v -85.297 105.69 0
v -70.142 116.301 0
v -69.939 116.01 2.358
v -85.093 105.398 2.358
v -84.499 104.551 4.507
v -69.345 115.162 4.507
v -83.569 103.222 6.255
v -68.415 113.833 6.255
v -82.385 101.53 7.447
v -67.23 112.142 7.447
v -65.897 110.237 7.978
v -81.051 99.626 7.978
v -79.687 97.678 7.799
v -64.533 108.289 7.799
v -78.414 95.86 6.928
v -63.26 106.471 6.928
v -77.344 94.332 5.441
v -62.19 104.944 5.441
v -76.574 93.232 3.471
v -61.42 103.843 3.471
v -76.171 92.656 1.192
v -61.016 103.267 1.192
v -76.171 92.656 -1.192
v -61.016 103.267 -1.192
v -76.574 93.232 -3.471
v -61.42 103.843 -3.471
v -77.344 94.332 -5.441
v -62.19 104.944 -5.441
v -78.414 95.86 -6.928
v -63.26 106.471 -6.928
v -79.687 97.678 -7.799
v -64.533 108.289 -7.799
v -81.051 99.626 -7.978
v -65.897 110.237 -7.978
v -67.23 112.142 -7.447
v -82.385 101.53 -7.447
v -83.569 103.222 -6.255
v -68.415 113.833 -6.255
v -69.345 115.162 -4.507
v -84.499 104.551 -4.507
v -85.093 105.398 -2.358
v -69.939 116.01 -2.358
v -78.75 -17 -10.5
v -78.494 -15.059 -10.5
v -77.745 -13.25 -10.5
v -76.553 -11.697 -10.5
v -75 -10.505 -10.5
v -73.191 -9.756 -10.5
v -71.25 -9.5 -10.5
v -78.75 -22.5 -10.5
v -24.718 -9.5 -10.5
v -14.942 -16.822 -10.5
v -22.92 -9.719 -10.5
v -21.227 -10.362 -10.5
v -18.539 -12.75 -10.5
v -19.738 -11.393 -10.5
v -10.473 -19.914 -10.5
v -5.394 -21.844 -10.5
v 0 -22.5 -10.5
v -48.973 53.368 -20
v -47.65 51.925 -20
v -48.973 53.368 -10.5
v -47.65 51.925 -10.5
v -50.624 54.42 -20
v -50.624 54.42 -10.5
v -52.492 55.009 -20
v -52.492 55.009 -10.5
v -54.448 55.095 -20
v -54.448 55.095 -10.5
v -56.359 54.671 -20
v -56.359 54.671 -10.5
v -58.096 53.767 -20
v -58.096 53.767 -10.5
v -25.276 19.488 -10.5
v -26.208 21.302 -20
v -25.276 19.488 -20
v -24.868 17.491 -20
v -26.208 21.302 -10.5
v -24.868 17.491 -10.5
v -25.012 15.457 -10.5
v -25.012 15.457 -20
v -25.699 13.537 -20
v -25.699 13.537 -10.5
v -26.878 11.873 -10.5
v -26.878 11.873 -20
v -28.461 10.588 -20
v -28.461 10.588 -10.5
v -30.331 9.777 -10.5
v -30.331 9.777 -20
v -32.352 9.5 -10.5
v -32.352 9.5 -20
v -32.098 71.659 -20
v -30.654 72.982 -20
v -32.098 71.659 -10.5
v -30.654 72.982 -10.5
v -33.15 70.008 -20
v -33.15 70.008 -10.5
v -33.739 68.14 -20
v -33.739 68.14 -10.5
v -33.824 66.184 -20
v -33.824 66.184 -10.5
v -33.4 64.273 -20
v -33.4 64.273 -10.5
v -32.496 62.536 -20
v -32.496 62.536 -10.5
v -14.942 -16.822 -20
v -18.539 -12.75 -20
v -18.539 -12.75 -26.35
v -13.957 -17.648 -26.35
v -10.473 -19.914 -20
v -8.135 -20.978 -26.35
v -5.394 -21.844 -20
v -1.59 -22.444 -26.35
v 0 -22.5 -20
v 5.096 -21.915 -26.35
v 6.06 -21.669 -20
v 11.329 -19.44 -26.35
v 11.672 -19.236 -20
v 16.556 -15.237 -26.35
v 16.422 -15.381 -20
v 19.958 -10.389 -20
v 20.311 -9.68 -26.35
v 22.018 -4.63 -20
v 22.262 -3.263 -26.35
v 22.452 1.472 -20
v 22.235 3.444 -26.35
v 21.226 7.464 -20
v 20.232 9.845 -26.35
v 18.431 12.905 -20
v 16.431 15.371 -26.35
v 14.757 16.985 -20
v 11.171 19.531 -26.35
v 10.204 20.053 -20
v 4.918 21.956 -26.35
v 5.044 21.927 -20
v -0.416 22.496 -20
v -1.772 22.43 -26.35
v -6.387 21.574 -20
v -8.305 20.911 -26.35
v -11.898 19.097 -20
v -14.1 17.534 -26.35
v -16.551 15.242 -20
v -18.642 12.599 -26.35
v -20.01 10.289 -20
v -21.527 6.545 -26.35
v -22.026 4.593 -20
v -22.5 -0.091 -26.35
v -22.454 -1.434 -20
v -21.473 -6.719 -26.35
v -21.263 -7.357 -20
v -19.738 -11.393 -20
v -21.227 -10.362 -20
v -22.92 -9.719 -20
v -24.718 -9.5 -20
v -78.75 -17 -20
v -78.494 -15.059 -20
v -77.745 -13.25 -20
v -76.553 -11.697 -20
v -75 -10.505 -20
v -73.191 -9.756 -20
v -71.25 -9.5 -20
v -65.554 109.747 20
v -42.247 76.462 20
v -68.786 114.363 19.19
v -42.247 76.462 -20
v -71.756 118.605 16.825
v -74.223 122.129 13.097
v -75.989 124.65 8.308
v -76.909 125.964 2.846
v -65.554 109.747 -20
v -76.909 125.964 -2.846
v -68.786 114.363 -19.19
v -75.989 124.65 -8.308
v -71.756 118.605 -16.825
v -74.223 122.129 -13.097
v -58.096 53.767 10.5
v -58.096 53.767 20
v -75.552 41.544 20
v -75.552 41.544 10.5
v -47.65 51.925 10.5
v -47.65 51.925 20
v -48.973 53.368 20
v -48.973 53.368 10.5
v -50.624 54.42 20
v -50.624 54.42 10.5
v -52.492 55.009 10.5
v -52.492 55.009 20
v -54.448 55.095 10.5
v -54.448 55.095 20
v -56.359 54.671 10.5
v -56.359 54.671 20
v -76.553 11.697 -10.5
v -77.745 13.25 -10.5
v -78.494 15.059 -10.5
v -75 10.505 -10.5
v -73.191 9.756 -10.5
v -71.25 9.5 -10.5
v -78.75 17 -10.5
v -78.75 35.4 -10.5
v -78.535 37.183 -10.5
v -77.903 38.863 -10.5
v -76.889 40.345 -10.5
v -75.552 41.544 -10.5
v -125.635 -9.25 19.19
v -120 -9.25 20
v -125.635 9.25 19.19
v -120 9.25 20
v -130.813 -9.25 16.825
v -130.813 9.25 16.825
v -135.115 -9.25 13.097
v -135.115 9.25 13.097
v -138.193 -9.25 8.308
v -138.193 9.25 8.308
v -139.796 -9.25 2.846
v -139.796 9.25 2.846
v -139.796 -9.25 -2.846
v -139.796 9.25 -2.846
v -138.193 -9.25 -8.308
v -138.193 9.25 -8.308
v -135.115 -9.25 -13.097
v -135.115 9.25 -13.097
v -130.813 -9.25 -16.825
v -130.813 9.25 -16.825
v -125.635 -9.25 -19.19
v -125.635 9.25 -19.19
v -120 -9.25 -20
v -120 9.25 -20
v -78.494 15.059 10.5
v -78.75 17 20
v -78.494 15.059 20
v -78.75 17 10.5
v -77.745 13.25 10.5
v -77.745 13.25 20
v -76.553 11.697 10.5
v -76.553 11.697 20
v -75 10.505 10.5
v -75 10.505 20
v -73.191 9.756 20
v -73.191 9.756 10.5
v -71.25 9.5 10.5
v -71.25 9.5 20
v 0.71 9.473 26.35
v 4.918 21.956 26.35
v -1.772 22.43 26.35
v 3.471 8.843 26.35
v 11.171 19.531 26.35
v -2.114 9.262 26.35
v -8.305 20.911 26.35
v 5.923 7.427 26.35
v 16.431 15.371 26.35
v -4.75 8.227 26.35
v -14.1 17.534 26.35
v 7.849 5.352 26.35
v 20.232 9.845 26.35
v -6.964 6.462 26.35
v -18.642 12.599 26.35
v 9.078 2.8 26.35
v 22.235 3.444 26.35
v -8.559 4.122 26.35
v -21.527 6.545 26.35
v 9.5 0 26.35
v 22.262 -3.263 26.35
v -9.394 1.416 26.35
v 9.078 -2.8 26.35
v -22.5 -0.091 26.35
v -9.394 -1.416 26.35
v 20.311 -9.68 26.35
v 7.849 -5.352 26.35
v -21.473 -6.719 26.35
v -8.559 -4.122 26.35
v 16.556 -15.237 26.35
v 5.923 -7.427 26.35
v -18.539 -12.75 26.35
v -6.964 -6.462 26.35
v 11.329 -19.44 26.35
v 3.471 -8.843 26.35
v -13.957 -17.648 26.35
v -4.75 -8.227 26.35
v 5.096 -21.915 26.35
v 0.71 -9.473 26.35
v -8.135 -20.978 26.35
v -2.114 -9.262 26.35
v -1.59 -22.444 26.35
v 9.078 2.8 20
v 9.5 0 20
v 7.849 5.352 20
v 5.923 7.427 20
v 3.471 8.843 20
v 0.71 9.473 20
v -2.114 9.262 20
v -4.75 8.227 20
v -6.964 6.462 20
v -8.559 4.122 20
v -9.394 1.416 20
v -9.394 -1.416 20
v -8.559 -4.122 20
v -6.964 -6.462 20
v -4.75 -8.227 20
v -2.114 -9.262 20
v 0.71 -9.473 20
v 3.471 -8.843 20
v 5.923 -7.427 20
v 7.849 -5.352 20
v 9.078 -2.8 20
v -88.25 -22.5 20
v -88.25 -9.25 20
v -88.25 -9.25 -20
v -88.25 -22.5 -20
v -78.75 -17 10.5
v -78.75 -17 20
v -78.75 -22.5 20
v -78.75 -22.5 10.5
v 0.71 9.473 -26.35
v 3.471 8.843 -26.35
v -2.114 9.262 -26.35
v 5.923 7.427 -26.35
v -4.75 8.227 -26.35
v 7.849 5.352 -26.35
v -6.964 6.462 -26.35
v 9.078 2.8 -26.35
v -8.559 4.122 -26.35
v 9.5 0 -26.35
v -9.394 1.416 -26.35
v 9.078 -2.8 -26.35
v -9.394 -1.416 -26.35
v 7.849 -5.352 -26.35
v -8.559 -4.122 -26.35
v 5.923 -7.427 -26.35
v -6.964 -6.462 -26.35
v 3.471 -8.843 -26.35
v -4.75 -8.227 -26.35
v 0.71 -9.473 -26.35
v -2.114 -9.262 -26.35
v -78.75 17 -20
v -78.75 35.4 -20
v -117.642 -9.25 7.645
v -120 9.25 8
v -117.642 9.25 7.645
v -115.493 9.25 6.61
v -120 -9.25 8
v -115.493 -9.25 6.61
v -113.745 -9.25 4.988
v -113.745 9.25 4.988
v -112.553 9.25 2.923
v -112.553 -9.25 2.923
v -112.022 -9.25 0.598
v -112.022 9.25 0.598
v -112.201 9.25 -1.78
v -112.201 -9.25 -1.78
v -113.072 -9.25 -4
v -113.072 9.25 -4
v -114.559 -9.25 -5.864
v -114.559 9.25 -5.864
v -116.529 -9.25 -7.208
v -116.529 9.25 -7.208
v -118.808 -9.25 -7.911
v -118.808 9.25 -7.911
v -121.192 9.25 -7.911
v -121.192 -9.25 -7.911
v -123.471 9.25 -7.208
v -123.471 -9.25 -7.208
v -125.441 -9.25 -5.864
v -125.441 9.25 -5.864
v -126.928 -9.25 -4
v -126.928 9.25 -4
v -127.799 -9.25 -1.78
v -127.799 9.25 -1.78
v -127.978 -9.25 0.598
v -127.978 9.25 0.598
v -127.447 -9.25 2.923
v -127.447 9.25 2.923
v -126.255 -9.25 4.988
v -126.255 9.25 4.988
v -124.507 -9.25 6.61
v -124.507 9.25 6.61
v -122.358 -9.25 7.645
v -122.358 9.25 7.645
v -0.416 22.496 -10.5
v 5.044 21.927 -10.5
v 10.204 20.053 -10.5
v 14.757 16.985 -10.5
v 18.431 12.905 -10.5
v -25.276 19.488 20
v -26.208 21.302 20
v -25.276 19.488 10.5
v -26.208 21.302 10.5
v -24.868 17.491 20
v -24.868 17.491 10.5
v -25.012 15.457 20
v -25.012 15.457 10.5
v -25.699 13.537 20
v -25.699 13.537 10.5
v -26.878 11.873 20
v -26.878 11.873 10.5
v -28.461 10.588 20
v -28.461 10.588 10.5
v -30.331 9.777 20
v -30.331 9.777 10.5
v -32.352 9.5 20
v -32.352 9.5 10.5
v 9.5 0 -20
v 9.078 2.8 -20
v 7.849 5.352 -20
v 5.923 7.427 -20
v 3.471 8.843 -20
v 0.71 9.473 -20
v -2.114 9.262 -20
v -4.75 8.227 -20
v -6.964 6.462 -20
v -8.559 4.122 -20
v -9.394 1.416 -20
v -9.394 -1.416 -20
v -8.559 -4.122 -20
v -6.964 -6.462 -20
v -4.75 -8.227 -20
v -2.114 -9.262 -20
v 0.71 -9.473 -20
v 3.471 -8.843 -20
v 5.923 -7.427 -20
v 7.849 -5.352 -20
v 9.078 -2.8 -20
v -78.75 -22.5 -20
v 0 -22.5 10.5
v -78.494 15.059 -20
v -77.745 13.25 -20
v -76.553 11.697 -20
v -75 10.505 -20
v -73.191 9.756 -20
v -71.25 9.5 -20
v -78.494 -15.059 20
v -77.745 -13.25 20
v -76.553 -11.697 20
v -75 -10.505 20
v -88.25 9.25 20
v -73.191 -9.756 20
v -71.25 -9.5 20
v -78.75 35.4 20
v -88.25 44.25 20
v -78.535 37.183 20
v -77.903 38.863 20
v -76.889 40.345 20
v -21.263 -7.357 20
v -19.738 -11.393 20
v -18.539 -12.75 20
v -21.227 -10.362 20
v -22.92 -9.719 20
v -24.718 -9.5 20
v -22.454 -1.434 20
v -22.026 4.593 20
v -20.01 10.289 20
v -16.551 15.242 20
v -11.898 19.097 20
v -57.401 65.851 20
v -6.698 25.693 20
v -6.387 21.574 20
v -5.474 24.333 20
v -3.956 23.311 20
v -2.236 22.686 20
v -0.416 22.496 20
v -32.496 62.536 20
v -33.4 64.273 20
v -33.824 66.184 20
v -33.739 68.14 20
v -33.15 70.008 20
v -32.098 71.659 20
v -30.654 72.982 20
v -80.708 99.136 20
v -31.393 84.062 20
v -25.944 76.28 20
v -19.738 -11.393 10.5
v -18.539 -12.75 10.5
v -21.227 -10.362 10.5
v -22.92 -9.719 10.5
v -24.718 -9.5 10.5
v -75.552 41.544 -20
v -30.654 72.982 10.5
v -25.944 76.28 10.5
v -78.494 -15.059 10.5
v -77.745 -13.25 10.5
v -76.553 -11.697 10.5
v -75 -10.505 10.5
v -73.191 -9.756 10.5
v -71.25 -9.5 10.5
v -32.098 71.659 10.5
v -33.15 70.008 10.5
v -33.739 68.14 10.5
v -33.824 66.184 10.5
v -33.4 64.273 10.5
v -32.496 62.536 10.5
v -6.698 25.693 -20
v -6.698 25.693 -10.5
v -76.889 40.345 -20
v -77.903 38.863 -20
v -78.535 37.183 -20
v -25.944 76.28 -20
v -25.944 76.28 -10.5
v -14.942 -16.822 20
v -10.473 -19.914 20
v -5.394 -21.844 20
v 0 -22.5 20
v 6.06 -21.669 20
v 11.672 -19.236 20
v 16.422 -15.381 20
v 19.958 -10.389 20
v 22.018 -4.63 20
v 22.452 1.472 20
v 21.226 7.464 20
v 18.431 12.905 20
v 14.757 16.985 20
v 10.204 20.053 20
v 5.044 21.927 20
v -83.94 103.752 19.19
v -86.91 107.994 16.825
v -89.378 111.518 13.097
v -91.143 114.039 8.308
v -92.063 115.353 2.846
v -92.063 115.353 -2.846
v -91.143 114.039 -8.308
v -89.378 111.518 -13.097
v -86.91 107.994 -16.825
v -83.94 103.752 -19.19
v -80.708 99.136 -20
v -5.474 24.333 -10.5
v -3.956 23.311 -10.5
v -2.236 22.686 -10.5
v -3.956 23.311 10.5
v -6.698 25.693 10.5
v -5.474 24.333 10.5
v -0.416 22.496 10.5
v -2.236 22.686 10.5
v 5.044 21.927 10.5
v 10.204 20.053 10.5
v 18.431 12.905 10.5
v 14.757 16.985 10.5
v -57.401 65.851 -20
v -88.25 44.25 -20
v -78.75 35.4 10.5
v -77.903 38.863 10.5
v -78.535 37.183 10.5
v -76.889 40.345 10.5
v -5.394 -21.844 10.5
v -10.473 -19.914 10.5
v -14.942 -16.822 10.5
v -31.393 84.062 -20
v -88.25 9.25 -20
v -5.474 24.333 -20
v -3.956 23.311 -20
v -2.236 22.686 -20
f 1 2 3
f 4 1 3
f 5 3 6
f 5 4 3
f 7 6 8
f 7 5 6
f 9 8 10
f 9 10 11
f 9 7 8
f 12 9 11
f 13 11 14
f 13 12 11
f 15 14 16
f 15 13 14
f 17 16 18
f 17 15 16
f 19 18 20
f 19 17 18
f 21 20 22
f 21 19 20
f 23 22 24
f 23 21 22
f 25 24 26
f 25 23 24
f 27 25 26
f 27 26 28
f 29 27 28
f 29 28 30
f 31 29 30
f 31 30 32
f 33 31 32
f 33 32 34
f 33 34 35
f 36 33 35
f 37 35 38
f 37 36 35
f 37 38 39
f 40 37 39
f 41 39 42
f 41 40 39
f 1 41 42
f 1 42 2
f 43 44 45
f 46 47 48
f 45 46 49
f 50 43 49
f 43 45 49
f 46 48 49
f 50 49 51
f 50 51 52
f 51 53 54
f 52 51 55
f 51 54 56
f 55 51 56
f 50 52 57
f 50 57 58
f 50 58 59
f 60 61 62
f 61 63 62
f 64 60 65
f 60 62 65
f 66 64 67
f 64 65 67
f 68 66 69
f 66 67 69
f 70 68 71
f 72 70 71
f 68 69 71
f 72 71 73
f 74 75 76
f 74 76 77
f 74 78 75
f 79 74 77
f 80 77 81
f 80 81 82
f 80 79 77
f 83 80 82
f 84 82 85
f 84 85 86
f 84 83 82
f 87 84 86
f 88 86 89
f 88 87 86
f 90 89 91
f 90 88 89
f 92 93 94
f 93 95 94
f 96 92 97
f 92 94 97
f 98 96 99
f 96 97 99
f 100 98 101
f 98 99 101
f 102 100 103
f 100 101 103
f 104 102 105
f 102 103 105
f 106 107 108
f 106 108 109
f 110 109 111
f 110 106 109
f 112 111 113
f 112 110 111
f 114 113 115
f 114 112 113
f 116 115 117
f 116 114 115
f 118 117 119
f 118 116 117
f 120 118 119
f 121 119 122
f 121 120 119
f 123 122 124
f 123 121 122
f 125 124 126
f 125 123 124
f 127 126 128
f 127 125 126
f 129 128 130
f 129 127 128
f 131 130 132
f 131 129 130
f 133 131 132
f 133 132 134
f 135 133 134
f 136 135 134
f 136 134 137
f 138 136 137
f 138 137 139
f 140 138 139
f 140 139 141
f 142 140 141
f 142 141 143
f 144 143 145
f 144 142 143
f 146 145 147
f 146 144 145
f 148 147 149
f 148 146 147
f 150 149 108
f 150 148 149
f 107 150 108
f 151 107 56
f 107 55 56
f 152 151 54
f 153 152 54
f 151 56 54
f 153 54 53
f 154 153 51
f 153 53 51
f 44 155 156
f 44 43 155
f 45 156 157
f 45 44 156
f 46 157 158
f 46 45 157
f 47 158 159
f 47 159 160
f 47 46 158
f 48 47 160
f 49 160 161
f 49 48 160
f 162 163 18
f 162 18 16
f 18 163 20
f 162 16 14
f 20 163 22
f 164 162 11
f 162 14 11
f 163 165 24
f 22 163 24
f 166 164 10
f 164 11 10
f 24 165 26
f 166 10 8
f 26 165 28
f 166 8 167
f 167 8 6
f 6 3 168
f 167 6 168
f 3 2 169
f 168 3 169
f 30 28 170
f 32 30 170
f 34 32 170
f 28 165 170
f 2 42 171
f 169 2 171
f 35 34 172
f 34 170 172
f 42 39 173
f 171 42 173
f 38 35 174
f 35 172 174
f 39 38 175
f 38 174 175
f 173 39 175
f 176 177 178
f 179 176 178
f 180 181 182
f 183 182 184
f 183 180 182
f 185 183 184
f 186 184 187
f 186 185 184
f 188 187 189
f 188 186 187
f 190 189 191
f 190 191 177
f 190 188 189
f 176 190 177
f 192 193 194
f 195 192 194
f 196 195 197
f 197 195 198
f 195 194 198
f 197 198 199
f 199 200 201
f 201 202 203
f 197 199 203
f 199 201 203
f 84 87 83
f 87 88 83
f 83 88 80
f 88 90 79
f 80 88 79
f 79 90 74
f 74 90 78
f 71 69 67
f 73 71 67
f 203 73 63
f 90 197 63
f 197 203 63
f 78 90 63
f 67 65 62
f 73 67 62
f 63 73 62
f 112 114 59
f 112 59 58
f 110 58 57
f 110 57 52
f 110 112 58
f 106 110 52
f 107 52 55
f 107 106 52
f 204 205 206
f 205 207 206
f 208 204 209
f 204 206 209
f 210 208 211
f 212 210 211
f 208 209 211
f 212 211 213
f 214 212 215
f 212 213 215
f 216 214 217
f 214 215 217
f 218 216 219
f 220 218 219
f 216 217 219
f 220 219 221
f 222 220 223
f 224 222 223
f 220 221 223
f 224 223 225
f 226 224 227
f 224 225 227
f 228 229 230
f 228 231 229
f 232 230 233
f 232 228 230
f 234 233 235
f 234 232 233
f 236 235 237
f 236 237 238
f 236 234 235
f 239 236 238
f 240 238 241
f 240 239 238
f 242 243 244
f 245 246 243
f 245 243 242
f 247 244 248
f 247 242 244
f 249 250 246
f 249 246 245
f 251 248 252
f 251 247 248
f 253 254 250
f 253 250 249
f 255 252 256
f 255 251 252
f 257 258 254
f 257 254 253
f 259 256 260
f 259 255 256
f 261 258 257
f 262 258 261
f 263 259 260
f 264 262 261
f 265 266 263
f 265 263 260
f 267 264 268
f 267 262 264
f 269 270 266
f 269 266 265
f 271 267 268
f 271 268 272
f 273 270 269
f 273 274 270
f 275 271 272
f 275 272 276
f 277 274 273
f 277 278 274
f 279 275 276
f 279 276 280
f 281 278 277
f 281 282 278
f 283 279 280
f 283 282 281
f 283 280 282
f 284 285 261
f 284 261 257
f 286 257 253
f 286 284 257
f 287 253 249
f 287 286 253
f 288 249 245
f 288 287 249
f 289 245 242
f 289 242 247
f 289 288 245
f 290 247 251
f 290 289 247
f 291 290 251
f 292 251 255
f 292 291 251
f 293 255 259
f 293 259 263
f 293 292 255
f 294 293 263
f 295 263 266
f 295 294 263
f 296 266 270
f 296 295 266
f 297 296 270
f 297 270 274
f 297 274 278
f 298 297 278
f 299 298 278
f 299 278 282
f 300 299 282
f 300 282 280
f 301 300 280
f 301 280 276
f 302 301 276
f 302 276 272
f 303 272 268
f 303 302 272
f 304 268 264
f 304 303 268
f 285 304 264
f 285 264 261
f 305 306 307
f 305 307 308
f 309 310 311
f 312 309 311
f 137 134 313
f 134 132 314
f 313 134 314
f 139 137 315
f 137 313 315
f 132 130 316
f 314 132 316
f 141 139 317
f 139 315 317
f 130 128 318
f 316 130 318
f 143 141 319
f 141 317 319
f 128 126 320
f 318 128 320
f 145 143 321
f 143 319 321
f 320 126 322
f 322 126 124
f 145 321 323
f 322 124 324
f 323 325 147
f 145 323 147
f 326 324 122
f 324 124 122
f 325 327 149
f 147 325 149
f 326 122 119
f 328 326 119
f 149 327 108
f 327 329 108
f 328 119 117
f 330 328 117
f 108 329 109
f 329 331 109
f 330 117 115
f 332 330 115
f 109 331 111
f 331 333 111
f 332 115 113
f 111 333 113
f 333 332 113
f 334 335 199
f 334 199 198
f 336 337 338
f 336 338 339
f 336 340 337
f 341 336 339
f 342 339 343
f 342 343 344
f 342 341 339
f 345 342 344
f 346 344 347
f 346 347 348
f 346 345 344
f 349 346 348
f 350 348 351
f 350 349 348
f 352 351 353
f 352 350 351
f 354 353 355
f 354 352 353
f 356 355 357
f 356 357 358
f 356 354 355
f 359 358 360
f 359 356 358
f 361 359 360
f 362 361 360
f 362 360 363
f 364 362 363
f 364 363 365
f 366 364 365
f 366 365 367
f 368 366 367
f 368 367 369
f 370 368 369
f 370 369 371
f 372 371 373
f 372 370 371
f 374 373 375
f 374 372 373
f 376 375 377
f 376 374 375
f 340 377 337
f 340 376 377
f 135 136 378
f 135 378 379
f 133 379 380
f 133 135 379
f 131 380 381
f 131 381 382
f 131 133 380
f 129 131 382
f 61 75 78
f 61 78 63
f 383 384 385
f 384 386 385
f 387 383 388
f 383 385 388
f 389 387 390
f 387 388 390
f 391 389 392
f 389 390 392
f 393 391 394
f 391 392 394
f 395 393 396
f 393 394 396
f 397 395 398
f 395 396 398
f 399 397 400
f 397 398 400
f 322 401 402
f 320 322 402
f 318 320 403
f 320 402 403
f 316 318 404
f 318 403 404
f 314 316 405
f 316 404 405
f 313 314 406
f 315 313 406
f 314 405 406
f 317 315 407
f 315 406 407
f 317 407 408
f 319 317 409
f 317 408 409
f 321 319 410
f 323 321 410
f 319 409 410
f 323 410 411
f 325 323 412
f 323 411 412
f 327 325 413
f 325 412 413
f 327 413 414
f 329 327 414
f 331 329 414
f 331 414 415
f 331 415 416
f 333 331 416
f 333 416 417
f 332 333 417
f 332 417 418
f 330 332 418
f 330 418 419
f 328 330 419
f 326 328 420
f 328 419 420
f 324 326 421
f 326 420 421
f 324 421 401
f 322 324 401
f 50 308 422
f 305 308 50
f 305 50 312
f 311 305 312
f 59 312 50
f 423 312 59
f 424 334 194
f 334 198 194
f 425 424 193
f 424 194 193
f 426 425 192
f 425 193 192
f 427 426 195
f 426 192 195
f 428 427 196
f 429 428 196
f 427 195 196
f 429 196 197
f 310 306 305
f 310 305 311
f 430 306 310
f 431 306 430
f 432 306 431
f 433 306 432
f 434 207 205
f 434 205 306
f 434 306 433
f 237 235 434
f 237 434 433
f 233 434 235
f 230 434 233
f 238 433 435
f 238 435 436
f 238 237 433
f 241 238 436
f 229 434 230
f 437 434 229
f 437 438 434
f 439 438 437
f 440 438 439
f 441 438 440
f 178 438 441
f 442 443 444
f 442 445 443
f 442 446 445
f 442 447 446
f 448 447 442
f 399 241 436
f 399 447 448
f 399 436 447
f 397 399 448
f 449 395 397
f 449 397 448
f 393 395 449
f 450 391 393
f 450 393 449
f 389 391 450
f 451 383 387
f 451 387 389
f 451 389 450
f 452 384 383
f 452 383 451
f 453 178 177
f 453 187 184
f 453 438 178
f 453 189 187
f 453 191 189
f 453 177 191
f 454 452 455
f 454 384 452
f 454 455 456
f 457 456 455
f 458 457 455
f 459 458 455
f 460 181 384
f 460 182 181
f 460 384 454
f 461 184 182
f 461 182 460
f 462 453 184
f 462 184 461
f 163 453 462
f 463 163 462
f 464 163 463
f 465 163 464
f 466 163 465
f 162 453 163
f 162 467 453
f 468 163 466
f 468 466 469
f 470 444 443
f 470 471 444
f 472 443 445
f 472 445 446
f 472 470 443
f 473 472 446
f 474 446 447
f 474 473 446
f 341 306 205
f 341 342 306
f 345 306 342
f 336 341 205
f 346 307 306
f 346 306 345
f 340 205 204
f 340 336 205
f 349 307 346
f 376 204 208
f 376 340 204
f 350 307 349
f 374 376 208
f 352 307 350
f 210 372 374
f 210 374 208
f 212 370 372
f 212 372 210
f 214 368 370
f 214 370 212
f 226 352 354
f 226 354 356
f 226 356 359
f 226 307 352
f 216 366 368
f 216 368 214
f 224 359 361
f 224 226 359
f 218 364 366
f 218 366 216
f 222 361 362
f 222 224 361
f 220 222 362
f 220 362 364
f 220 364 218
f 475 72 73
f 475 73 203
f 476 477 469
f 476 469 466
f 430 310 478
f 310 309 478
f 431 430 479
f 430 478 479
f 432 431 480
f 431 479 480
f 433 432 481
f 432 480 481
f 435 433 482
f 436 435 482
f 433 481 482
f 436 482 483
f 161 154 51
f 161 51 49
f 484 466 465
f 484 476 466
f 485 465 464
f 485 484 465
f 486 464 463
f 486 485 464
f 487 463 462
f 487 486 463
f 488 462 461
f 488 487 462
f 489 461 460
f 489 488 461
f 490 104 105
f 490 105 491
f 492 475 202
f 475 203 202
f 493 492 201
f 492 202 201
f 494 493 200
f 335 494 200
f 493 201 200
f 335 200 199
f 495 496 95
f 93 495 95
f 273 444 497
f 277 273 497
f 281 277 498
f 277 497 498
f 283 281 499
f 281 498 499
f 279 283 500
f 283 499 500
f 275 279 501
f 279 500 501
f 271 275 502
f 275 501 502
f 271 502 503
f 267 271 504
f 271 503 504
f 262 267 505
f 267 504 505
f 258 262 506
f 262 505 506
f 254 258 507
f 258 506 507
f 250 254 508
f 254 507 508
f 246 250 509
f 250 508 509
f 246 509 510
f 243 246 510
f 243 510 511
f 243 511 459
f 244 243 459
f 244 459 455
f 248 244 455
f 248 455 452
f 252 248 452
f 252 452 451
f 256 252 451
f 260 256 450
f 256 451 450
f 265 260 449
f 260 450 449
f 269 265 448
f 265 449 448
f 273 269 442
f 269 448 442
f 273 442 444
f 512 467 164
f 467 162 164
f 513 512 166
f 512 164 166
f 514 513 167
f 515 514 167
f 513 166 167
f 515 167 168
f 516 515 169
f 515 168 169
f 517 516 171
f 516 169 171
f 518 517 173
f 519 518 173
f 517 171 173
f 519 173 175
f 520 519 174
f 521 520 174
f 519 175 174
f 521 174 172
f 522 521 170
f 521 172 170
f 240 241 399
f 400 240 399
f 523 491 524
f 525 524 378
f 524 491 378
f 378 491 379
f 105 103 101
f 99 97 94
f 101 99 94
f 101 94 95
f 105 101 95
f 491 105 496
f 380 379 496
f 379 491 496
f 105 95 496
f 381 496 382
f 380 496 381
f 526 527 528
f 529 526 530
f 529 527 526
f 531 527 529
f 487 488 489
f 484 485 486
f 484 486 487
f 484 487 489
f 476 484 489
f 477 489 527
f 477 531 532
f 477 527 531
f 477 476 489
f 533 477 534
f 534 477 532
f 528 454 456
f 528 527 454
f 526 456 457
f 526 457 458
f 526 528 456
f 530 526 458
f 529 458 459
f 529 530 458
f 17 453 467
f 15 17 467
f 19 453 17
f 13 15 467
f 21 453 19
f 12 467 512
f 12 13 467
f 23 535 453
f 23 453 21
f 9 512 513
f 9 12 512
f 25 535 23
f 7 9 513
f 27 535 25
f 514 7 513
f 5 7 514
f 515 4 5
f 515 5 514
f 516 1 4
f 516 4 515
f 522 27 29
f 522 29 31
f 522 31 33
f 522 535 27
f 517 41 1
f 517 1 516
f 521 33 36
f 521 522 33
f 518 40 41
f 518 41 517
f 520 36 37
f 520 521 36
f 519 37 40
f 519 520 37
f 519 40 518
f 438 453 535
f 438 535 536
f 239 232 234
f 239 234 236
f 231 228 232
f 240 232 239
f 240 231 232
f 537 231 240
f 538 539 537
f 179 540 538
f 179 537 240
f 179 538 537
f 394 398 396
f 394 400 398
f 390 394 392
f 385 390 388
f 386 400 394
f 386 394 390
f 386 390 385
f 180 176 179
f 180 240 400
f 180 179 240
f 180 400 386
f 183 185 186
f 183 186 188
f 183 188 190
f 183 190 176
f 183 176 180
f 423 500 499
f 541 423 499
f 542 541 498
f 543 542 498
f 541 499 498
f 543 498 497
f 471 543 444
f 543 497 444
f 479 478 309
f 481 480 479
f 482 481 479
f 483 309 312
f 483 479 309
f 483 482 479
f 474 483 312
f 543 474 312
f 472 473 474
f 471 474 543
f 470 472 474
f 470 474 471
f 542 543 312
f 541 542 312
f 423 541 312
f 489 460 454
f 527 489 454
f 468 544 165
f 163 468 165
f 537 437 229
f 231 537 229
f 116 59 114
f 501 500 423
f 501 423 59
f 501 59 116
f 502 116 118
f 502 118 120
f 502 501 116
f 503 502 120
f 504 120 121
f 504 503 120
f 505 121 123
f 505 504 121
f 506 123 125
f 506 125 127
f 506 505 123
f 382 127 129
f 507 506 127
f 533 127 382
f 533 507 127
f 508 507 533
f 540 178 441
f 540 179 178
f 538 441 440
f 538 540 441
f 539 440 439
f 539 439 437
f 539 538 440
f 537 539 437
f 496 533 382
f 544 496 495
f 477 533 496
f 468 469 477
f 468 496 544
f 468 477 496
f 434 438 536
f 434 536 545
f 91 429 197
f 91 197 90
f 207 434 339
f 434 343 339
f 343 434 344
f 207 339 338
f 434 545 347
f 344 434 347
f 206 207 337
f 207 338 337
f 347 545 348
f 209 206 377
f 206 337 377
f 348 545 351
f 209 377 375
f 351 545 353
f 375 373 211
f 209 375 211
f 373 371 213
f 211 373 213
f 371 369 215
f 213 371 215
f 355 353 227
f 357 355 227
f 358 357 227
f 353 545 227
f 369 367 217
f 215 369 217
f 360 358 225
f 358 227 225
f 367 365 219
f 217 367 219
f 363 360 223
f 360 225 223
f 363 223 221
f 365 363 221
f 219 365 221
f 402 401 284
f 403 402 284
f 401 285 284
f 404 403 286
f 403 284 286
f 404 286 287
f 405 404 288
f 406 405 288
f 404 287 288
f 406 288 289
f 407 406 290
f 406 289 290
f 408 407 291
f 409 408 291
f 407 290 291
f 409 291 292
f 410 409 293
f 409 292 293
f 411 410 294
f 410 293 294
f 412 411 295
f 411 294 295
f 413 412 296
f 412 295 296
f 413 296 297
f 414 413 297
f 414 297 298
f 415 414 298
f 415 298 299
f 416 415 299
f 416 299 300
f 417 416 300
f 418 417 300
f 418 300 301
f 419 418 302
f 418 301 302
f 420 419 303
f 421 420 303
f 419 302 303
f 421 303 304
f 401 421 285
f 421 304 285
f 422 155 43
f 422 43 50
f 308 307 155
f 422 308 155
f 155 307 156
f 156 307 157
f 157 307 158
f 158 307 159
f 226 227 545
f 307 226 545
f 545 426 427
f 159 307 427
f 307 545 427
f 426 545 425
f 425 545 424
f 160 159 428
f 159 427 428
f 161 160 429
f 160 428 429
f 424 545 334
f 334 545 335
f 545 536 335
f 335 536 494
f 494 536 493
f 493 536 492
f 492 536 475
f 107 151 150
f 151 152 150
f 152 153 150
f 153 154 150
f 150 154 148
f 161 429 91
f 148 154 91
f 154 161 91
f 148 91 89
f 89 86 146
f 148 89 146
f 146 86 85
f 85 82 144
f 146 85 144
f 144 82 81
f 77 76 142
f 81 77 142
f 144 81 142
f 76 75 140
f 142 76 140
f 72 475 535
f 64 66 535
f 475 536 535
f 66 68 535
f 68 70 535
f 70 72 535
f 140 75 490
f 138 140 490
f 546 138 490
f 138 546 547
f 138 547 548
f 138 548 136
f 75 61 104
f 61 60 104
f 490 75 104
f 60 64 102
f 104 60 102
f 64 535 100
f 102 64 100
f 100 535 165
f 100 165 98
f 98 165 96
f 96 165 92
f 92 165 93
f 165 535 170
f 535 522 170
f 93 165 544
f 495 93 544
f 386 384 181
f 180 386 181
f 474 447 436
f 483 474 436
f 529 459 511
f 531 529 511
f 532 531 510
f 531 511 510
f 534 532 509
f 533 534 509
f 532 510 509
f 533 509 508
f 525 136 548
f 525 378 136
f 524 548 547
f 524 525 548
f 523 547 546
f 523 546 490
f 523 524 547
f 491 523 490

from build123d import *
from build123d.topology import SkipClean

# Parameters (mm, degrees)
SKETCH2_R            = 8
BOSS_EXTRUDE1_DEPTH  = 9.25
SKETCH3_R            = 8
BOSS_EXTRUDE2_DEPTH  = 9.25
SKETCH5_R            = 22.5
BOSS_EXTRUDE3_DEPTH  = 20
SKETCH6_R            = 9.5
CUT_EXTRUDE1_DEPTH   = 20
CUT_EXTRUDE3_DEPTH   = 9.5
FILLET1_R            = 7.5
FILLET1_OF_MIRROR1_R = 7.5
SKETCH9_R            = 22.5
SKETCH9_R_2          = 9.5
BOSS_EXTRUDE5_DEPTH  = 6.35


with BuildPart() as part:
    # Sketch2 → Boss-Extrude1 (new, symmetric)
    with BuildSketch(Plane(origin=(0, 0, 0), x_dir=(1, 0, 0), z_dir=(0, 1, 0))):
        with BuildLine():
            Line((0, -20), (-120, -20))
            ThreePointArc((-120, -20), (-140, 0), (-120, 20))
            Line((-120, 20), (0, 20))
            Line((0, 20), (0, -20))
        make_face()
        with Locations(Location((-120, 0, 0), (0, 0, 270))):
            Circle(SKETCH2_R, mode=Mode.SUBTRACT)
    extrude(amount=BOSS_EXTRUDE1_DEPTH, both=True)

    # Sketch3 → Boss-Extrude2 (add, symmetric)
    with BuildSketch(Plane(origin=(0, 0, 0), x_dir=(0.5735764363510444, -0.819152044288993, 0), z_dir=(0.819152044288993, 0.5735764363510444, 0))):
        with BuildLine():
            Line((0, -20), (-127.5, -20))
            ThreePointArc((-127.5, -20), (-147.5, 0), (-127.5, 20))
            Line((-127.5, 20), (0, 20))
            Line((0, 20), (0, -20))
        make_face()
        with Locations(Location((-127.5, 0, 0), (0, 0, 180))):
            Circle(SKETCH3_R, mode=Mode.SUBTRACT)
    extrude(amount=BOSS_EXTRUDE2_DEPTH, both=True)

    # Sketch5 → Boss-Extrude3 (add, symmetric)
    with BuildSketch(Plane.XY):
        with BuildLine():
            Line((-88.25, -22.5), (0, -22.5))
            ThreePointArc((0, -22.5), (-19.957743747, 10.389343798), (18.430920997, 12.905469818))
            Line((18.430920997, 12.905469818), (-31.393139414, 84.061602381))
            Line((-31.393139414, 84.061602381), (-88.25, 44.25))
            Line((-88.25, 44.25), (-88.25, -22.5))
        make_face()
        Circle(SKETCH5_R)
    extrude(amount=BOSS_EXTRUDE3_DEPTH, both=True)

    # Sketch6 → Cut-Extrude1 (cut, symmetric)
    with BuildSketch(Plane.XY):
        Circle(SKETCH6_R)
    extrude(amount=CUT_EXTRUDE1_DEPTH, both=True, mode=Mode.SUBTRACT)

    # Sketch7 → Cut-Extrude3 (cut)
    with BuildSketch(Plane.XY.offset(20)):
        with BuildLine():
            Line((-78.75, -22.5), (0, -22.5))
            ThreePointArc((0, -22.5), (-12.093386622, -18.973665961), (-20.396078054, -9.5))
            Line((-20.396078054, -9.5), (-78.75, -9.5))
            Line((-78.75, -9.5), (-78.75, -22.5))
        make_face()
        with BuildLine():
            Line((-25.944163269, 76.27965796), (-36.797927856, 68.679770179))
            Line((-36.797927856, 68.679770179), (-4.187279424, 22.106937622))
            ThreePointArc((-4.187279424, 22.106937622), (8.47862511, 20.841375105), (18.430920997, 12.905469818))
            Line((18.430920997, 12.905469818), (-25.944163269, 76.27965796))
        make_face()
        Polygon((-17.944136559, 9.5), (-51.952240675, 58.068606106), (-78.75, 39.30461302), (-78.75, 9.5), align=None)
    cut_extrude3 = extrude(amount=-CUT_EXTRUDE3_DEPTH, mode=Mode.SUBTRACT)

    # Fillet1
    fillet1_edges = [part.edges().sort_by_distance(p)[0] for p in [
        (-20.396078054, -9.5, 15.25),
        (-78.75, -9.5, 15.25),
        (-78.75, 39.30461302, 15.25),
        (-51.952240675, 58.068606106, 15.25),
        (-17.944136559, 9.5, 15.25),
        (-78.75, 9.5, 15.25),
        (-4.187279424, 22.106937622, 15.25),
        (-36.797927856, 68.679770179, 15.25),
    ]]
    fillet(fillet1_edges, radius=FILLET1_R)

    # Mirror1: Cut-Extrude3 across plane
    add(cut_extrude3.mirror(Plane.XY), mode=Mode.SUBTRACT)

    # Fillet1 of Mirror1
    fillet1_of_mirror1_edges = [part.edges().sort_by_distance(p)[0] for p in [
        (-20.396078054, -9.5, -15.25),
        (-78.75, -9.5, -15.25),
        (-78.75, 39.30461302, -15.25),
        (-51.952240675, 58.068606106, -15.25),
        (-17.944136559, 9.5, -15.25),
        (-78.75, 9.5, -15.25),
        (-4.187279424, 22.106937622, -15.25),
        (-36.797927856, 68.679770179, -15.25),
    ]]
    fillet(fillet1_of_mirror1_edges, radius=FILLET1_OF_MIRROR1_R)

    # Sketch9 → Boss-Extrude5 (add)
    with SkipClean():  # the faces are left unmerged after this step: merging them gives an invalid solid
        with BuildSketch(Plane.XY.offset(20)):
            with Locations(Location((0, 0, 0), (0, 0, 214.518107841))):
                Circle(SKETCH9_R)
            Circle(SKETCH9_R_2, mode=Mode.SUBTRACT)
        boss_extrude5 = extrude(amount=BOSS_EXTRUDE5_DEPTH)

    # Mirror2: Boss-Extrude5 across plane
    with SkipClean():  # the faces are left unmerged after this step: merging them gives an invalid solid
        add(boss_extrude5.mirror(Plane.XY))


solid = part.part
